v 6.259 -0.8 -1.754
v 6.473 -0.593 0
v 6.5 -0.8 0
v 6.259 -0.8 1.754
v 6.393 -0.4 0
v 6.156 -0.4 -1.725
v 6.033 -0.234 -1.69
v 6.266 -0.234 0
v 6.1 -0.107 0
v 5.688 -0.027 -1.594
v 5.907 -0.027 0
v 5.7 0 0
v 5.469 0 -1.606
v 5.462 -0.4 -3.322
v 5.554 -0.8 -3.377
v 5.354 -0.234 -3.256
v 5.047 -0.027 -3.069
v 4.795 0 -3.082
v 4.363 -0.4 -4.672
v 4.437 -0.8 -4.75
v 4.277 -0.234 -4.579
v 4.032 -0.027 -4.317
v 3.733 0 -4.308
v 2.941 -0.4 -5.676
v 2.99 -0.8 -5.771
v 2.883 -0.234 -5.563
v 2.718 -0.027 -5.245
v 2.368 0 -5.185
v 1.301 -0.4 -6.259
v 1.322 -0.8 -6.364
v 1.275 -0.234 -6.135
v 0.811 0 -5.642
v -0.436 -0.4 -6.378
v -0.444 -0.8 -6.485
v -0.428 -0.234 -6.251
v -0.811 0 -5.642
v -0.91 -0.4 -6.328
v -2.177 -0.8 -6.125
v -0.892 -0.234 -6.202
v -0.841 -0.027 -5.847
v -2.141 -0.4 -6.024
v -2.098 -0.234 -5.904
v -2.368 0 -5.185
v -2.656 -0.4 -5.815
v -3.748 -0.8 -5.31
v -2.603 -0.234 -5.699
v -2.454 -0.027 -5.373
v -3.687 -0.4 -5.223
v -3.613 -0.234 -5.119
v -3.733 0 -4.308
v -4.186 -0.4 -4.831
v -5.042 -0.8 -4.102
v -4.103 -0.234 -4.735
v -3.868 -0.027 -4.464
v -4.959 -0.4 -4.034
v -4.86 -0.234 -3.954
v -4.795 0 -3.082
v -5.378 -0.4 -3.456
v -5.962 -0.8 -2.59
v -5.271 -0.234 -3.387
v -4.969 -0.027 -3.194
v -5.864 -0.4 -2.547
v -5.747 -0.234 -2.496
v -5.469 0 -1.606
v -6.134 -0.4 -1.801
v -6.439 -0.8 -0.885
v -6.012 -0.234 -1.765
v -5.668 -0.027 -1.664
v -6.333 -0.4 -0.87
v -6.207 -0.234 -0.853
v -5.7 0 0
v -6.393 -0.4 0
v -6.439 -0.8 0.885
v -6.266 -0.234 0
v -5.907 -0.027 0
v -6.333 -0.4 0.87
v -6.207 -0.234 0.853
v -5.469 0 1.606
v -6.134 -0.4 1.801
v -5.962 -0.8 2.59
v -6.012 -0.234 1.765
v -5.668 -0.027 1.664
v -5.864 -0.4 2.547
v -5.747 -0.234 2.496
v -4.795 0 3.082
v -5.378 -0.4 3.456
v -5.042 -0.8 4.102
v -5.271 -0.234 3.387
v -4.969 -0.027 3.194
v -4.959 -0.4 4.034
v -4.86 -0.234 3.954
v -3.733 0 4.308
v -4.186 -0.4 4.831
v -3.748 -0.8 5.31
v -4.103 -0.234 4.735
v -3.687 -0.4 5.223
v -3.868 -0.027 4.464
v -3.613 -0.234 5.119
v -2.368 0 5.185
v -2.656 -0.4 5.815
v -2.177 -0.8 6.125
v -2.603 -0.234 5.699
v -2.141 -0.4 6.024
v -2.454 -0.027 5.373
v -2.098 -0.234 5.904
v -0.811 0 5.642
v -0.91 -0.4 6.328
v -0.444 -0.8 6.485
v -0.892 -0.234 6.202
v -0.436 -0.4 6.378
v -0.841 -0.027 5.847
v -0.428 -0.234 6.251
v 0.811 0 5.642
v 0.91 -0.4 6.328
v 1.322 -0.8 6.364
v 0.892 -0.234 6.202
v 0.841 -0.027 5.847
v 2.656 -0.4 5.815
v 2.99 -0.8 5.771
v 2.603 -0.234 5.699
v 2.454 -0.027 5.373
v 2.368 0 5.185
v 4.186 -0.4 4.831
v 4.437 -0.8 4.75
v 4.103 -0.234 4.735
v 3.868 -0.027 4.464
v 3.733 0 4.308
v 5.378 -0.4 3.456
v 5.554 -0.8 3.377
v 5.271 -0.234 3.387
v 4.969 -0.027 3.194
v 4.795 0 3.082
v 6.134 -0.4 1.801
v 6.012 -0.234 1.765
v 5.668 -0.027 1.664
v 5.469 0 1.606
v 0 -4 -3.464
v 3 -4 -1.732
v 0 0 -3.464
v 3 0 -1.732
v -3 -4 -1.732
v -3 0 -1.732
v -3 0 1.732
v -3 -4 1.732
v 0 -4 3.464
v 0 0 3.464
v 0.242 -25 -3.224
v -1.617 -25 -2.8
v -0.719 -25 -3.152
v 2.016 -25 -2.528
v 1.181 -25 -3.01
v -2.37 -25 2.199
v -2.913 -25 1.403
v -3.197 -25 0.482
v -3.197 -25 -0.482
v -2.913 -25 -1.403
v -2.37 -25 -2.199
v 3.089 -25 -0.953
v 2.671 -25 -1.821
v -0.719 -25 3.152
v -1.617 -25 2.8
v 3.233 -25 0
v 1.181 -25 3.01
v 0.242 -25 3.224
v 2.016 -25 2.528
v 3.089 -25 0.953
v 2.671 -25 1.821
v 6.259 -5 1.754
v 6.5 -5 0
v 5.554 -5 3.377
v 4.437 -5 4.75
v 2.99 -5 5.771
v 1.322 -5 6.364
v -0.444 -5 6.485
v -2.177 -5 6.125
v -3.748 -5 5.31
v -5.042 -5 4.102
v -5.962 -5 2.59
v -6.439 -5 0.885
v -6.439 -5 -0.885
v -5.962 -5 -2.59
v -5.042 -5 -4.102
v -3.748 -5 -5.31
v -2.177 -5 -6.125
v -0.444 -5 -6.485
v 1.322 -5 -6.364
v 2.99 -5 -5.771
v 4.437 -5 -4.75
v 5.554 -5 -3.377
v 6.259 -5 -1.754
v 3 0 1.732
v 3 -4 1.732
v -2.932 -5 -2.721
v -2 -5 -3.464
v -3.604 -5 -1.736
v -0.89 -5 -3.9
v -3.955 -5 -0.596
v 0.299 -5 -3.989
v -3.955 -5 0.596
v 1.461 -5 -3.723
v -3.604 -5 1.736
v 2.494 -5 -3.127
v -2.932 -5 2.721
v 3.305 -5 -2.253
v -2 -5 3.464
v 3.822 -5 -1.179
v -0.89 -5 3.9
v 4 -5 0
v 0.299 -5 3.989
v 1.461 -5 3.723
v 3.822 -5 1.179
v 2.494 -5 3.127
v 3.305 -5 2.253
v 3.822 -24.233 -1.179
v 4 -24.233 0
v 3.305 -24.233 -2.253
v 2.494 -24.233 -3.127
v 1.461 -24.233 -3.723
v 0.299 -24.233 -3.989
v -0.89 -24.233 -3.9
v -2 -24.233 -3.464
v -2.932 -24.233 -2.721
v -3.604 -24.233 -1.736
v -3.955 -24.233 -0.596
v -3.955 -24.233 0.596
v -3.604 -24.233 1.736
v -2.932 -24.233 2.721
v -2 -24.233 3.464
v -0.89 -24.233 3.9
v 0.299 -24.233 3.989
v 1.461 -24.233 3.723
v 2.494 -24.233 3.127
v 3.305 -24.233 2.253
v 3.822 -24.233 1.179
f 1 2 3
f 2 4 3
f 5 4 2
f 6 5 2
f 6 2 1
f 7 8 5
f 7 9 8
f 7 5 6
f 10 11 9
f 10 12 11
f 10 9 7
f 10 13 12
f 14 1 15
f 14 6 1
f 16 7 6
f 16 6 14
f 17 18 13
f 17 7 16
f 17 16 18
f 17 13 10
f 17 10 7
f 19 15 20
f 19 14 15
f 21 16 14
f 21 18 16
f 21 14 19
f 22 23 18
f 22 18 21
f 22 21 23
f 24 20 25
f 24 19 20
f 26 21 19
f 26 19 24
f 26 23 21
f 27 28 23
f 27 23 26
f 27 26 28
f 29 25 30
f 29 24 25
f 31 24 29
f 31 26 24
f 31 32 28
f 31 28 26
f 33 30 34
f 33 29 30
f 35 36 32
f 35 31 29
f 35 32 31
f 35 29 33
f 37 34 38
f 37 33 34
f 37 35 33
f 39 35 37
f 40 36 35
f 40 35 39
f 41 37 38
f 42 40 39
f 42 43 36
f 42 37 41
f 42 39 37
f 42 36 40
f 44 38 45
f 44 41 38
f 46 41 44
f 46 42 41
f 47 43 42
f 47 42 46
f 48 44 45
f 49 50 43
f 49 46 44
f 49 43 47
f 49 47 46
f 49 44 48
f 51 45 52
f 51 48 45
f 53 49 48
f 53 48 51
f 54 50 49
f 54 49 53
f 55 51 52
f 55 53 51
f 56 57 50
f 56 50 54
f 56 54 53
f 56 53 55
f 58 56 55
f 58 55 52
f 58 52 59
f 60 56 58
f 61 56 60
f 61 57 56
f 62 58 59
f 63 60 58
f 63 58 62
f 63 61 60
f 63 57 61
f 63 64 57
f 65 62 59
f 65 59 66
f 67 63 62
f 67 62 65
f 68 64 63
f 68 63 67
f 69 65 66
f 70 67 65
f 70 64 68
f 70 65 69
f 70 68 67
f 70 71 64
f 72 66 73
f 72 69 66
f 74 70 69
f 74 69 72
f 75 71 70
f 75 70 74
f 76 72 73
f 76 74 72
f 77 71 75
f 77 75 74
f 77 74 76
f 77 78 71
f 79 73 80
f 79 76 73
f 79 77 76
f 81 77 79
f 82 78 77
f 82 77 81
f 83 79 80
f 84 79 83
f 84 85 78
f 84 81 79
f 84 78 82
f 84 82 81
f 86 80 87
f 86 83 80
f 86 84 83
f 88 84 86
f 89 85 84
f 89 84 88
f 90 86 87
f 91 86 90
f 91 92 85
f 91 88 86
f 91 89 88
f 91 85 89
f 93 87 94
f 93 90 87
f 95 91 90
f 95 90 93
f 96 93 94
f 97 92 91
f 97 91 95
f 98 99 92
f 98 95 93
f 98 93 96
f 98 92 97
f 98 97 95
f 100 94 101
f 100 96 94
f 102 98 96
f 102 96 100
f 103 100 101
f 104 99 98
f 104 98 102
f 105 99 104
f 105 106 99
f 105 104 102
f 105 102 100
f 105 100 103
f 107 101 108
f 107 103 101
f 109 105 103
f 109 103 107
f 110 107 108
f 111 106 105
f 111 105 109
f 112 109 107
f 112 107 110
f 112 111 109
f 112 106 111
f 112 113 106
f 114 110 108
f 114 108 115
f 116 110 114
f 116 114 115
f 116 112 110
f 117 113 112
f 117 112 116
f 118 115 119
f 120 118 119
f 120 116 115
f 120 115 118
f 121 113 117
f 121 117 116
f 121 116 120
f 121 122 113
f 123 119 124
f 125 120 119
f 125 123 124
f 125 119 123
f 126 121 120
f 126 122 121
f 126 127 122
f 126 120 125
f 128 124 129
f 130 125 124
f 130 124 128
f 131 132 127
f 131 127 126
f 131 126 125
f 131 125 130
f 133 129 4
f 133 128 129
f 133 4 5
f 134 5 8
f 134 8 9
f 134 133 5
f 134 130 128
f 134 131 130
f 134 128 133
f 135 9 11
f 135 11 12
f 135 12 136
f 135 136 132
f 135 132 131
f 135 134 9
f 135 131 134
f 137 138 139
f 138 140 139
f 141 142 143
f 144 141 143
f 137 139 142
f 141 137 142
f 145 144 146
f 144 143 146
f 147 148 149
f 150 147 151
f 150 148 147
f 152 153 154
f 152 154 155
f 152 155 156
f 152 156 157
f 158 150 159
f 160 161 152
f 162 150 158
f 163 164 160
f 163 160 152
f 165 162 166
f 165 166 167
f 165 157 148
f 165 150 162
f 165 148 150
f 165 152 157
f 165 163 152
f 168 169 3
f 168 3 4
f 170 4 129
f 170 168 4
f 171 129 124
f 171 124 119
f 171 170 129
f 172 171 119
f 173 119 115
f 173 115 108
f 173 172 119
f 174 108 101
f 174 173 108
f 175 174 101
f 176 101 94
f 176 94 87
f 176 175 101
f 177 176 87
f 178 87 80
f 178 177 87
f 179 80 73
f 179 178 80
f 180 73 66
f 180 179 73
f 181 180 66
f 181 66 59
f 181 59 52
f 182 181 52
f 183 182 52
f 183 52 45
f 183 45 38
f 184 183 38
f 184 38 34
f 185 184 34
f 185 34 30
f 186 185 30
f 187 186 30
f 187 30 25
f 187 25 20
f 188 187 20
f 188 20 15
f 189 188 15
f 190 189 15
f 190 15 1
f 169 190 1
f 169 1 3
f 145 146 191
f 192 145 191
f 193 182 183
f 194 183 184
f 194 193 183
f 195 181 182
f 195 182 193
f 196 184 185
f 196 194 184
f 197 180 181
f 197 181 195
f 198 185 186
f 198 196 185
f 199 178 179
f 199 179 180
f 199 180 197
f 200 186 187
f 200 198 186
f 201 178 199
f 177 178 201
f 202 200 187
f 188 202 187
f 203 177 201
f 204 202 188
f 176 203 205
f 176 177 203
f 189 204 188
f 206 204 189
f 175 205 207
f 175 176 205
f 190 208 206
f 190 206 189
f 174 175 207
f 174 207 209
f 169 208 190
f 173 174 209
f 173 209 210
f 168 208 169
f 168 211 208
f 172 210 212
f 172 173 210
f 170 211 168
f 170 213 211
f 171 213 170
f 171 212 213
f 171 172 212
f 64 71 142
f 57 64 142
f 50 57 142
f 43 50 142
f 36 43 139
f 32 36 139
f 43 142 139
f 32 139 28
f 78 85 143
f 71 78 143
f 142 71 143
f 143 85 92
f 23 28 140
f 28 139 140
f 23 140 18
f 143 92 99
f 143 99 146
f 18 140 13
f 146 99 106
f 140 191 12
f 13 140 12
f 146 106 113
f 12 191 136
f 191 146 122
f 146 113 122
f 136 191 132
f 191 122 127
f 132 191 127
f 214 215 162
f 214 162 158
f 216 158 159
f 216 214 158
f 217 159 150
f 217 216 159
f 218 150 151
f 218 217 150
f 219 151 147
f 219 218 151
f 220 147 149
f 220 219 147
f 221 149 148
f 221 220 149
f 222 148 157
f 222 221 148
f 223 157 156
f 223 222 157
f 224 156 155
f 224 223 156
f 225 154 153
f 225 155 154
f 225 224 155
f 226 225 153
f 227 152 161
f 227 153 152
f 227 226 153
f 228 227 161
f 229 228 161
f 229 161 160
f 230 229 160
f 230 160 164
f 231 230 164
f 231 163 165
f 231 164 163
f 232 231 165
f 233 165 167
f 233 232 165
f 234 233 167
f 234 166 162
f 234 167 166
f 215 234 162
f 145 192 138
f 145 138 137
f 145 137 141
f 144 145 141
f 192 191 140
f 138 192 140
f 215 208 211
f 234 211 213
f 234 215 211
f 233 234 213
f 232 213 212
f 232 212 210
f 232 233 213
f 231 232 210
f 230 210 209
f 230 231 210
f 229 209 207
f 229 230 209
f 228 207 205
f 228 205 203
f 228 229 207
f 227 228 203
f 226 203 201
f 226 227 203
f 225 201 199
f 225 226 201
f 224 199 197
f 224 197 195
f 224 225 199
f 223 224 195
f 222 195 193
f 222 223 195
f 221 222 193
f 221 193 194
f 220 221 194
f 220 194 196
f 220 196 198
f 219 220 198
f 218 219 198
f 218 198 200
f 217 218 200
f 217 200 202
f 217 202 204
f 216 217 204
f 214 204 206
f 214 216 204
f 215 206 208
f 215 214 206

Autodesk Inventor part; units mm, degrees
sketch "Sketch_1" plane through (0, 0, 0) normal (0, 0, 1) x (1, 0, 0)
  line L0 (0, -50) -> (0, 50)
  line L1 (0, 0) -> (5.7, 0)
  arc A0 (6.5, -0.8) -> (5.7, 0) centre (5.7, -0.8) ccw
  line L2 (6.5, -0.8) -> (6.5, -5)
  line L3 (6.5, -5) -> (4, -5)
  line L4 (4, -5) -> (4, -24.233)
  line L5 (4, -24.233) -> (3.233, -25)
  line L6 (3.233, -25) -> (0, -25)
  line L7 (0, -25) -> (0, 0)
revolve "Revolution1" add sketch "Sketch_1" angle 360 about axis through (0, -50, 0) along (0, -1, 0)
thread "Thread1" size "M8x1.25" class "6g" standard "ISO Metric profile" length 12.233
sketch "Sketch_2" plane through (0, 0, 0) normal (0, 1, 0) x (-1, 0, 0)
  line L0 (3, 1.7321) -> (0, 3.4641)
  line L1 (0, 3.4641) -> (-3, 1.7321)
  line L2 (-3, 1.7321) -> (-3, -1.7321)
  line L3 (-3, -1.7321) -> (0, -3.4641)
  line L4 (0, -3.4641) -> (3, -1.7321)
  line L5 (3, -1.7321) -> (3, 1.7321)
extrude "Extrusion1" cut sketch "Sketch_2" against normal blind 4
ref_plane "p1_XY" through (0, -5, 0) normal (0, -1, 0) x (1, 0, 0)
ref_plane "p1_YZ" through (0, -5, 0) normal (1, 0, 0) x (0, 0, 1)
ref_plane "p1_ZX" through (0, -5, 0) normal (0, 0, 1) x (0, -1, 0)
properties part number "Zylinderschraube DIN 6912 M8x20"
